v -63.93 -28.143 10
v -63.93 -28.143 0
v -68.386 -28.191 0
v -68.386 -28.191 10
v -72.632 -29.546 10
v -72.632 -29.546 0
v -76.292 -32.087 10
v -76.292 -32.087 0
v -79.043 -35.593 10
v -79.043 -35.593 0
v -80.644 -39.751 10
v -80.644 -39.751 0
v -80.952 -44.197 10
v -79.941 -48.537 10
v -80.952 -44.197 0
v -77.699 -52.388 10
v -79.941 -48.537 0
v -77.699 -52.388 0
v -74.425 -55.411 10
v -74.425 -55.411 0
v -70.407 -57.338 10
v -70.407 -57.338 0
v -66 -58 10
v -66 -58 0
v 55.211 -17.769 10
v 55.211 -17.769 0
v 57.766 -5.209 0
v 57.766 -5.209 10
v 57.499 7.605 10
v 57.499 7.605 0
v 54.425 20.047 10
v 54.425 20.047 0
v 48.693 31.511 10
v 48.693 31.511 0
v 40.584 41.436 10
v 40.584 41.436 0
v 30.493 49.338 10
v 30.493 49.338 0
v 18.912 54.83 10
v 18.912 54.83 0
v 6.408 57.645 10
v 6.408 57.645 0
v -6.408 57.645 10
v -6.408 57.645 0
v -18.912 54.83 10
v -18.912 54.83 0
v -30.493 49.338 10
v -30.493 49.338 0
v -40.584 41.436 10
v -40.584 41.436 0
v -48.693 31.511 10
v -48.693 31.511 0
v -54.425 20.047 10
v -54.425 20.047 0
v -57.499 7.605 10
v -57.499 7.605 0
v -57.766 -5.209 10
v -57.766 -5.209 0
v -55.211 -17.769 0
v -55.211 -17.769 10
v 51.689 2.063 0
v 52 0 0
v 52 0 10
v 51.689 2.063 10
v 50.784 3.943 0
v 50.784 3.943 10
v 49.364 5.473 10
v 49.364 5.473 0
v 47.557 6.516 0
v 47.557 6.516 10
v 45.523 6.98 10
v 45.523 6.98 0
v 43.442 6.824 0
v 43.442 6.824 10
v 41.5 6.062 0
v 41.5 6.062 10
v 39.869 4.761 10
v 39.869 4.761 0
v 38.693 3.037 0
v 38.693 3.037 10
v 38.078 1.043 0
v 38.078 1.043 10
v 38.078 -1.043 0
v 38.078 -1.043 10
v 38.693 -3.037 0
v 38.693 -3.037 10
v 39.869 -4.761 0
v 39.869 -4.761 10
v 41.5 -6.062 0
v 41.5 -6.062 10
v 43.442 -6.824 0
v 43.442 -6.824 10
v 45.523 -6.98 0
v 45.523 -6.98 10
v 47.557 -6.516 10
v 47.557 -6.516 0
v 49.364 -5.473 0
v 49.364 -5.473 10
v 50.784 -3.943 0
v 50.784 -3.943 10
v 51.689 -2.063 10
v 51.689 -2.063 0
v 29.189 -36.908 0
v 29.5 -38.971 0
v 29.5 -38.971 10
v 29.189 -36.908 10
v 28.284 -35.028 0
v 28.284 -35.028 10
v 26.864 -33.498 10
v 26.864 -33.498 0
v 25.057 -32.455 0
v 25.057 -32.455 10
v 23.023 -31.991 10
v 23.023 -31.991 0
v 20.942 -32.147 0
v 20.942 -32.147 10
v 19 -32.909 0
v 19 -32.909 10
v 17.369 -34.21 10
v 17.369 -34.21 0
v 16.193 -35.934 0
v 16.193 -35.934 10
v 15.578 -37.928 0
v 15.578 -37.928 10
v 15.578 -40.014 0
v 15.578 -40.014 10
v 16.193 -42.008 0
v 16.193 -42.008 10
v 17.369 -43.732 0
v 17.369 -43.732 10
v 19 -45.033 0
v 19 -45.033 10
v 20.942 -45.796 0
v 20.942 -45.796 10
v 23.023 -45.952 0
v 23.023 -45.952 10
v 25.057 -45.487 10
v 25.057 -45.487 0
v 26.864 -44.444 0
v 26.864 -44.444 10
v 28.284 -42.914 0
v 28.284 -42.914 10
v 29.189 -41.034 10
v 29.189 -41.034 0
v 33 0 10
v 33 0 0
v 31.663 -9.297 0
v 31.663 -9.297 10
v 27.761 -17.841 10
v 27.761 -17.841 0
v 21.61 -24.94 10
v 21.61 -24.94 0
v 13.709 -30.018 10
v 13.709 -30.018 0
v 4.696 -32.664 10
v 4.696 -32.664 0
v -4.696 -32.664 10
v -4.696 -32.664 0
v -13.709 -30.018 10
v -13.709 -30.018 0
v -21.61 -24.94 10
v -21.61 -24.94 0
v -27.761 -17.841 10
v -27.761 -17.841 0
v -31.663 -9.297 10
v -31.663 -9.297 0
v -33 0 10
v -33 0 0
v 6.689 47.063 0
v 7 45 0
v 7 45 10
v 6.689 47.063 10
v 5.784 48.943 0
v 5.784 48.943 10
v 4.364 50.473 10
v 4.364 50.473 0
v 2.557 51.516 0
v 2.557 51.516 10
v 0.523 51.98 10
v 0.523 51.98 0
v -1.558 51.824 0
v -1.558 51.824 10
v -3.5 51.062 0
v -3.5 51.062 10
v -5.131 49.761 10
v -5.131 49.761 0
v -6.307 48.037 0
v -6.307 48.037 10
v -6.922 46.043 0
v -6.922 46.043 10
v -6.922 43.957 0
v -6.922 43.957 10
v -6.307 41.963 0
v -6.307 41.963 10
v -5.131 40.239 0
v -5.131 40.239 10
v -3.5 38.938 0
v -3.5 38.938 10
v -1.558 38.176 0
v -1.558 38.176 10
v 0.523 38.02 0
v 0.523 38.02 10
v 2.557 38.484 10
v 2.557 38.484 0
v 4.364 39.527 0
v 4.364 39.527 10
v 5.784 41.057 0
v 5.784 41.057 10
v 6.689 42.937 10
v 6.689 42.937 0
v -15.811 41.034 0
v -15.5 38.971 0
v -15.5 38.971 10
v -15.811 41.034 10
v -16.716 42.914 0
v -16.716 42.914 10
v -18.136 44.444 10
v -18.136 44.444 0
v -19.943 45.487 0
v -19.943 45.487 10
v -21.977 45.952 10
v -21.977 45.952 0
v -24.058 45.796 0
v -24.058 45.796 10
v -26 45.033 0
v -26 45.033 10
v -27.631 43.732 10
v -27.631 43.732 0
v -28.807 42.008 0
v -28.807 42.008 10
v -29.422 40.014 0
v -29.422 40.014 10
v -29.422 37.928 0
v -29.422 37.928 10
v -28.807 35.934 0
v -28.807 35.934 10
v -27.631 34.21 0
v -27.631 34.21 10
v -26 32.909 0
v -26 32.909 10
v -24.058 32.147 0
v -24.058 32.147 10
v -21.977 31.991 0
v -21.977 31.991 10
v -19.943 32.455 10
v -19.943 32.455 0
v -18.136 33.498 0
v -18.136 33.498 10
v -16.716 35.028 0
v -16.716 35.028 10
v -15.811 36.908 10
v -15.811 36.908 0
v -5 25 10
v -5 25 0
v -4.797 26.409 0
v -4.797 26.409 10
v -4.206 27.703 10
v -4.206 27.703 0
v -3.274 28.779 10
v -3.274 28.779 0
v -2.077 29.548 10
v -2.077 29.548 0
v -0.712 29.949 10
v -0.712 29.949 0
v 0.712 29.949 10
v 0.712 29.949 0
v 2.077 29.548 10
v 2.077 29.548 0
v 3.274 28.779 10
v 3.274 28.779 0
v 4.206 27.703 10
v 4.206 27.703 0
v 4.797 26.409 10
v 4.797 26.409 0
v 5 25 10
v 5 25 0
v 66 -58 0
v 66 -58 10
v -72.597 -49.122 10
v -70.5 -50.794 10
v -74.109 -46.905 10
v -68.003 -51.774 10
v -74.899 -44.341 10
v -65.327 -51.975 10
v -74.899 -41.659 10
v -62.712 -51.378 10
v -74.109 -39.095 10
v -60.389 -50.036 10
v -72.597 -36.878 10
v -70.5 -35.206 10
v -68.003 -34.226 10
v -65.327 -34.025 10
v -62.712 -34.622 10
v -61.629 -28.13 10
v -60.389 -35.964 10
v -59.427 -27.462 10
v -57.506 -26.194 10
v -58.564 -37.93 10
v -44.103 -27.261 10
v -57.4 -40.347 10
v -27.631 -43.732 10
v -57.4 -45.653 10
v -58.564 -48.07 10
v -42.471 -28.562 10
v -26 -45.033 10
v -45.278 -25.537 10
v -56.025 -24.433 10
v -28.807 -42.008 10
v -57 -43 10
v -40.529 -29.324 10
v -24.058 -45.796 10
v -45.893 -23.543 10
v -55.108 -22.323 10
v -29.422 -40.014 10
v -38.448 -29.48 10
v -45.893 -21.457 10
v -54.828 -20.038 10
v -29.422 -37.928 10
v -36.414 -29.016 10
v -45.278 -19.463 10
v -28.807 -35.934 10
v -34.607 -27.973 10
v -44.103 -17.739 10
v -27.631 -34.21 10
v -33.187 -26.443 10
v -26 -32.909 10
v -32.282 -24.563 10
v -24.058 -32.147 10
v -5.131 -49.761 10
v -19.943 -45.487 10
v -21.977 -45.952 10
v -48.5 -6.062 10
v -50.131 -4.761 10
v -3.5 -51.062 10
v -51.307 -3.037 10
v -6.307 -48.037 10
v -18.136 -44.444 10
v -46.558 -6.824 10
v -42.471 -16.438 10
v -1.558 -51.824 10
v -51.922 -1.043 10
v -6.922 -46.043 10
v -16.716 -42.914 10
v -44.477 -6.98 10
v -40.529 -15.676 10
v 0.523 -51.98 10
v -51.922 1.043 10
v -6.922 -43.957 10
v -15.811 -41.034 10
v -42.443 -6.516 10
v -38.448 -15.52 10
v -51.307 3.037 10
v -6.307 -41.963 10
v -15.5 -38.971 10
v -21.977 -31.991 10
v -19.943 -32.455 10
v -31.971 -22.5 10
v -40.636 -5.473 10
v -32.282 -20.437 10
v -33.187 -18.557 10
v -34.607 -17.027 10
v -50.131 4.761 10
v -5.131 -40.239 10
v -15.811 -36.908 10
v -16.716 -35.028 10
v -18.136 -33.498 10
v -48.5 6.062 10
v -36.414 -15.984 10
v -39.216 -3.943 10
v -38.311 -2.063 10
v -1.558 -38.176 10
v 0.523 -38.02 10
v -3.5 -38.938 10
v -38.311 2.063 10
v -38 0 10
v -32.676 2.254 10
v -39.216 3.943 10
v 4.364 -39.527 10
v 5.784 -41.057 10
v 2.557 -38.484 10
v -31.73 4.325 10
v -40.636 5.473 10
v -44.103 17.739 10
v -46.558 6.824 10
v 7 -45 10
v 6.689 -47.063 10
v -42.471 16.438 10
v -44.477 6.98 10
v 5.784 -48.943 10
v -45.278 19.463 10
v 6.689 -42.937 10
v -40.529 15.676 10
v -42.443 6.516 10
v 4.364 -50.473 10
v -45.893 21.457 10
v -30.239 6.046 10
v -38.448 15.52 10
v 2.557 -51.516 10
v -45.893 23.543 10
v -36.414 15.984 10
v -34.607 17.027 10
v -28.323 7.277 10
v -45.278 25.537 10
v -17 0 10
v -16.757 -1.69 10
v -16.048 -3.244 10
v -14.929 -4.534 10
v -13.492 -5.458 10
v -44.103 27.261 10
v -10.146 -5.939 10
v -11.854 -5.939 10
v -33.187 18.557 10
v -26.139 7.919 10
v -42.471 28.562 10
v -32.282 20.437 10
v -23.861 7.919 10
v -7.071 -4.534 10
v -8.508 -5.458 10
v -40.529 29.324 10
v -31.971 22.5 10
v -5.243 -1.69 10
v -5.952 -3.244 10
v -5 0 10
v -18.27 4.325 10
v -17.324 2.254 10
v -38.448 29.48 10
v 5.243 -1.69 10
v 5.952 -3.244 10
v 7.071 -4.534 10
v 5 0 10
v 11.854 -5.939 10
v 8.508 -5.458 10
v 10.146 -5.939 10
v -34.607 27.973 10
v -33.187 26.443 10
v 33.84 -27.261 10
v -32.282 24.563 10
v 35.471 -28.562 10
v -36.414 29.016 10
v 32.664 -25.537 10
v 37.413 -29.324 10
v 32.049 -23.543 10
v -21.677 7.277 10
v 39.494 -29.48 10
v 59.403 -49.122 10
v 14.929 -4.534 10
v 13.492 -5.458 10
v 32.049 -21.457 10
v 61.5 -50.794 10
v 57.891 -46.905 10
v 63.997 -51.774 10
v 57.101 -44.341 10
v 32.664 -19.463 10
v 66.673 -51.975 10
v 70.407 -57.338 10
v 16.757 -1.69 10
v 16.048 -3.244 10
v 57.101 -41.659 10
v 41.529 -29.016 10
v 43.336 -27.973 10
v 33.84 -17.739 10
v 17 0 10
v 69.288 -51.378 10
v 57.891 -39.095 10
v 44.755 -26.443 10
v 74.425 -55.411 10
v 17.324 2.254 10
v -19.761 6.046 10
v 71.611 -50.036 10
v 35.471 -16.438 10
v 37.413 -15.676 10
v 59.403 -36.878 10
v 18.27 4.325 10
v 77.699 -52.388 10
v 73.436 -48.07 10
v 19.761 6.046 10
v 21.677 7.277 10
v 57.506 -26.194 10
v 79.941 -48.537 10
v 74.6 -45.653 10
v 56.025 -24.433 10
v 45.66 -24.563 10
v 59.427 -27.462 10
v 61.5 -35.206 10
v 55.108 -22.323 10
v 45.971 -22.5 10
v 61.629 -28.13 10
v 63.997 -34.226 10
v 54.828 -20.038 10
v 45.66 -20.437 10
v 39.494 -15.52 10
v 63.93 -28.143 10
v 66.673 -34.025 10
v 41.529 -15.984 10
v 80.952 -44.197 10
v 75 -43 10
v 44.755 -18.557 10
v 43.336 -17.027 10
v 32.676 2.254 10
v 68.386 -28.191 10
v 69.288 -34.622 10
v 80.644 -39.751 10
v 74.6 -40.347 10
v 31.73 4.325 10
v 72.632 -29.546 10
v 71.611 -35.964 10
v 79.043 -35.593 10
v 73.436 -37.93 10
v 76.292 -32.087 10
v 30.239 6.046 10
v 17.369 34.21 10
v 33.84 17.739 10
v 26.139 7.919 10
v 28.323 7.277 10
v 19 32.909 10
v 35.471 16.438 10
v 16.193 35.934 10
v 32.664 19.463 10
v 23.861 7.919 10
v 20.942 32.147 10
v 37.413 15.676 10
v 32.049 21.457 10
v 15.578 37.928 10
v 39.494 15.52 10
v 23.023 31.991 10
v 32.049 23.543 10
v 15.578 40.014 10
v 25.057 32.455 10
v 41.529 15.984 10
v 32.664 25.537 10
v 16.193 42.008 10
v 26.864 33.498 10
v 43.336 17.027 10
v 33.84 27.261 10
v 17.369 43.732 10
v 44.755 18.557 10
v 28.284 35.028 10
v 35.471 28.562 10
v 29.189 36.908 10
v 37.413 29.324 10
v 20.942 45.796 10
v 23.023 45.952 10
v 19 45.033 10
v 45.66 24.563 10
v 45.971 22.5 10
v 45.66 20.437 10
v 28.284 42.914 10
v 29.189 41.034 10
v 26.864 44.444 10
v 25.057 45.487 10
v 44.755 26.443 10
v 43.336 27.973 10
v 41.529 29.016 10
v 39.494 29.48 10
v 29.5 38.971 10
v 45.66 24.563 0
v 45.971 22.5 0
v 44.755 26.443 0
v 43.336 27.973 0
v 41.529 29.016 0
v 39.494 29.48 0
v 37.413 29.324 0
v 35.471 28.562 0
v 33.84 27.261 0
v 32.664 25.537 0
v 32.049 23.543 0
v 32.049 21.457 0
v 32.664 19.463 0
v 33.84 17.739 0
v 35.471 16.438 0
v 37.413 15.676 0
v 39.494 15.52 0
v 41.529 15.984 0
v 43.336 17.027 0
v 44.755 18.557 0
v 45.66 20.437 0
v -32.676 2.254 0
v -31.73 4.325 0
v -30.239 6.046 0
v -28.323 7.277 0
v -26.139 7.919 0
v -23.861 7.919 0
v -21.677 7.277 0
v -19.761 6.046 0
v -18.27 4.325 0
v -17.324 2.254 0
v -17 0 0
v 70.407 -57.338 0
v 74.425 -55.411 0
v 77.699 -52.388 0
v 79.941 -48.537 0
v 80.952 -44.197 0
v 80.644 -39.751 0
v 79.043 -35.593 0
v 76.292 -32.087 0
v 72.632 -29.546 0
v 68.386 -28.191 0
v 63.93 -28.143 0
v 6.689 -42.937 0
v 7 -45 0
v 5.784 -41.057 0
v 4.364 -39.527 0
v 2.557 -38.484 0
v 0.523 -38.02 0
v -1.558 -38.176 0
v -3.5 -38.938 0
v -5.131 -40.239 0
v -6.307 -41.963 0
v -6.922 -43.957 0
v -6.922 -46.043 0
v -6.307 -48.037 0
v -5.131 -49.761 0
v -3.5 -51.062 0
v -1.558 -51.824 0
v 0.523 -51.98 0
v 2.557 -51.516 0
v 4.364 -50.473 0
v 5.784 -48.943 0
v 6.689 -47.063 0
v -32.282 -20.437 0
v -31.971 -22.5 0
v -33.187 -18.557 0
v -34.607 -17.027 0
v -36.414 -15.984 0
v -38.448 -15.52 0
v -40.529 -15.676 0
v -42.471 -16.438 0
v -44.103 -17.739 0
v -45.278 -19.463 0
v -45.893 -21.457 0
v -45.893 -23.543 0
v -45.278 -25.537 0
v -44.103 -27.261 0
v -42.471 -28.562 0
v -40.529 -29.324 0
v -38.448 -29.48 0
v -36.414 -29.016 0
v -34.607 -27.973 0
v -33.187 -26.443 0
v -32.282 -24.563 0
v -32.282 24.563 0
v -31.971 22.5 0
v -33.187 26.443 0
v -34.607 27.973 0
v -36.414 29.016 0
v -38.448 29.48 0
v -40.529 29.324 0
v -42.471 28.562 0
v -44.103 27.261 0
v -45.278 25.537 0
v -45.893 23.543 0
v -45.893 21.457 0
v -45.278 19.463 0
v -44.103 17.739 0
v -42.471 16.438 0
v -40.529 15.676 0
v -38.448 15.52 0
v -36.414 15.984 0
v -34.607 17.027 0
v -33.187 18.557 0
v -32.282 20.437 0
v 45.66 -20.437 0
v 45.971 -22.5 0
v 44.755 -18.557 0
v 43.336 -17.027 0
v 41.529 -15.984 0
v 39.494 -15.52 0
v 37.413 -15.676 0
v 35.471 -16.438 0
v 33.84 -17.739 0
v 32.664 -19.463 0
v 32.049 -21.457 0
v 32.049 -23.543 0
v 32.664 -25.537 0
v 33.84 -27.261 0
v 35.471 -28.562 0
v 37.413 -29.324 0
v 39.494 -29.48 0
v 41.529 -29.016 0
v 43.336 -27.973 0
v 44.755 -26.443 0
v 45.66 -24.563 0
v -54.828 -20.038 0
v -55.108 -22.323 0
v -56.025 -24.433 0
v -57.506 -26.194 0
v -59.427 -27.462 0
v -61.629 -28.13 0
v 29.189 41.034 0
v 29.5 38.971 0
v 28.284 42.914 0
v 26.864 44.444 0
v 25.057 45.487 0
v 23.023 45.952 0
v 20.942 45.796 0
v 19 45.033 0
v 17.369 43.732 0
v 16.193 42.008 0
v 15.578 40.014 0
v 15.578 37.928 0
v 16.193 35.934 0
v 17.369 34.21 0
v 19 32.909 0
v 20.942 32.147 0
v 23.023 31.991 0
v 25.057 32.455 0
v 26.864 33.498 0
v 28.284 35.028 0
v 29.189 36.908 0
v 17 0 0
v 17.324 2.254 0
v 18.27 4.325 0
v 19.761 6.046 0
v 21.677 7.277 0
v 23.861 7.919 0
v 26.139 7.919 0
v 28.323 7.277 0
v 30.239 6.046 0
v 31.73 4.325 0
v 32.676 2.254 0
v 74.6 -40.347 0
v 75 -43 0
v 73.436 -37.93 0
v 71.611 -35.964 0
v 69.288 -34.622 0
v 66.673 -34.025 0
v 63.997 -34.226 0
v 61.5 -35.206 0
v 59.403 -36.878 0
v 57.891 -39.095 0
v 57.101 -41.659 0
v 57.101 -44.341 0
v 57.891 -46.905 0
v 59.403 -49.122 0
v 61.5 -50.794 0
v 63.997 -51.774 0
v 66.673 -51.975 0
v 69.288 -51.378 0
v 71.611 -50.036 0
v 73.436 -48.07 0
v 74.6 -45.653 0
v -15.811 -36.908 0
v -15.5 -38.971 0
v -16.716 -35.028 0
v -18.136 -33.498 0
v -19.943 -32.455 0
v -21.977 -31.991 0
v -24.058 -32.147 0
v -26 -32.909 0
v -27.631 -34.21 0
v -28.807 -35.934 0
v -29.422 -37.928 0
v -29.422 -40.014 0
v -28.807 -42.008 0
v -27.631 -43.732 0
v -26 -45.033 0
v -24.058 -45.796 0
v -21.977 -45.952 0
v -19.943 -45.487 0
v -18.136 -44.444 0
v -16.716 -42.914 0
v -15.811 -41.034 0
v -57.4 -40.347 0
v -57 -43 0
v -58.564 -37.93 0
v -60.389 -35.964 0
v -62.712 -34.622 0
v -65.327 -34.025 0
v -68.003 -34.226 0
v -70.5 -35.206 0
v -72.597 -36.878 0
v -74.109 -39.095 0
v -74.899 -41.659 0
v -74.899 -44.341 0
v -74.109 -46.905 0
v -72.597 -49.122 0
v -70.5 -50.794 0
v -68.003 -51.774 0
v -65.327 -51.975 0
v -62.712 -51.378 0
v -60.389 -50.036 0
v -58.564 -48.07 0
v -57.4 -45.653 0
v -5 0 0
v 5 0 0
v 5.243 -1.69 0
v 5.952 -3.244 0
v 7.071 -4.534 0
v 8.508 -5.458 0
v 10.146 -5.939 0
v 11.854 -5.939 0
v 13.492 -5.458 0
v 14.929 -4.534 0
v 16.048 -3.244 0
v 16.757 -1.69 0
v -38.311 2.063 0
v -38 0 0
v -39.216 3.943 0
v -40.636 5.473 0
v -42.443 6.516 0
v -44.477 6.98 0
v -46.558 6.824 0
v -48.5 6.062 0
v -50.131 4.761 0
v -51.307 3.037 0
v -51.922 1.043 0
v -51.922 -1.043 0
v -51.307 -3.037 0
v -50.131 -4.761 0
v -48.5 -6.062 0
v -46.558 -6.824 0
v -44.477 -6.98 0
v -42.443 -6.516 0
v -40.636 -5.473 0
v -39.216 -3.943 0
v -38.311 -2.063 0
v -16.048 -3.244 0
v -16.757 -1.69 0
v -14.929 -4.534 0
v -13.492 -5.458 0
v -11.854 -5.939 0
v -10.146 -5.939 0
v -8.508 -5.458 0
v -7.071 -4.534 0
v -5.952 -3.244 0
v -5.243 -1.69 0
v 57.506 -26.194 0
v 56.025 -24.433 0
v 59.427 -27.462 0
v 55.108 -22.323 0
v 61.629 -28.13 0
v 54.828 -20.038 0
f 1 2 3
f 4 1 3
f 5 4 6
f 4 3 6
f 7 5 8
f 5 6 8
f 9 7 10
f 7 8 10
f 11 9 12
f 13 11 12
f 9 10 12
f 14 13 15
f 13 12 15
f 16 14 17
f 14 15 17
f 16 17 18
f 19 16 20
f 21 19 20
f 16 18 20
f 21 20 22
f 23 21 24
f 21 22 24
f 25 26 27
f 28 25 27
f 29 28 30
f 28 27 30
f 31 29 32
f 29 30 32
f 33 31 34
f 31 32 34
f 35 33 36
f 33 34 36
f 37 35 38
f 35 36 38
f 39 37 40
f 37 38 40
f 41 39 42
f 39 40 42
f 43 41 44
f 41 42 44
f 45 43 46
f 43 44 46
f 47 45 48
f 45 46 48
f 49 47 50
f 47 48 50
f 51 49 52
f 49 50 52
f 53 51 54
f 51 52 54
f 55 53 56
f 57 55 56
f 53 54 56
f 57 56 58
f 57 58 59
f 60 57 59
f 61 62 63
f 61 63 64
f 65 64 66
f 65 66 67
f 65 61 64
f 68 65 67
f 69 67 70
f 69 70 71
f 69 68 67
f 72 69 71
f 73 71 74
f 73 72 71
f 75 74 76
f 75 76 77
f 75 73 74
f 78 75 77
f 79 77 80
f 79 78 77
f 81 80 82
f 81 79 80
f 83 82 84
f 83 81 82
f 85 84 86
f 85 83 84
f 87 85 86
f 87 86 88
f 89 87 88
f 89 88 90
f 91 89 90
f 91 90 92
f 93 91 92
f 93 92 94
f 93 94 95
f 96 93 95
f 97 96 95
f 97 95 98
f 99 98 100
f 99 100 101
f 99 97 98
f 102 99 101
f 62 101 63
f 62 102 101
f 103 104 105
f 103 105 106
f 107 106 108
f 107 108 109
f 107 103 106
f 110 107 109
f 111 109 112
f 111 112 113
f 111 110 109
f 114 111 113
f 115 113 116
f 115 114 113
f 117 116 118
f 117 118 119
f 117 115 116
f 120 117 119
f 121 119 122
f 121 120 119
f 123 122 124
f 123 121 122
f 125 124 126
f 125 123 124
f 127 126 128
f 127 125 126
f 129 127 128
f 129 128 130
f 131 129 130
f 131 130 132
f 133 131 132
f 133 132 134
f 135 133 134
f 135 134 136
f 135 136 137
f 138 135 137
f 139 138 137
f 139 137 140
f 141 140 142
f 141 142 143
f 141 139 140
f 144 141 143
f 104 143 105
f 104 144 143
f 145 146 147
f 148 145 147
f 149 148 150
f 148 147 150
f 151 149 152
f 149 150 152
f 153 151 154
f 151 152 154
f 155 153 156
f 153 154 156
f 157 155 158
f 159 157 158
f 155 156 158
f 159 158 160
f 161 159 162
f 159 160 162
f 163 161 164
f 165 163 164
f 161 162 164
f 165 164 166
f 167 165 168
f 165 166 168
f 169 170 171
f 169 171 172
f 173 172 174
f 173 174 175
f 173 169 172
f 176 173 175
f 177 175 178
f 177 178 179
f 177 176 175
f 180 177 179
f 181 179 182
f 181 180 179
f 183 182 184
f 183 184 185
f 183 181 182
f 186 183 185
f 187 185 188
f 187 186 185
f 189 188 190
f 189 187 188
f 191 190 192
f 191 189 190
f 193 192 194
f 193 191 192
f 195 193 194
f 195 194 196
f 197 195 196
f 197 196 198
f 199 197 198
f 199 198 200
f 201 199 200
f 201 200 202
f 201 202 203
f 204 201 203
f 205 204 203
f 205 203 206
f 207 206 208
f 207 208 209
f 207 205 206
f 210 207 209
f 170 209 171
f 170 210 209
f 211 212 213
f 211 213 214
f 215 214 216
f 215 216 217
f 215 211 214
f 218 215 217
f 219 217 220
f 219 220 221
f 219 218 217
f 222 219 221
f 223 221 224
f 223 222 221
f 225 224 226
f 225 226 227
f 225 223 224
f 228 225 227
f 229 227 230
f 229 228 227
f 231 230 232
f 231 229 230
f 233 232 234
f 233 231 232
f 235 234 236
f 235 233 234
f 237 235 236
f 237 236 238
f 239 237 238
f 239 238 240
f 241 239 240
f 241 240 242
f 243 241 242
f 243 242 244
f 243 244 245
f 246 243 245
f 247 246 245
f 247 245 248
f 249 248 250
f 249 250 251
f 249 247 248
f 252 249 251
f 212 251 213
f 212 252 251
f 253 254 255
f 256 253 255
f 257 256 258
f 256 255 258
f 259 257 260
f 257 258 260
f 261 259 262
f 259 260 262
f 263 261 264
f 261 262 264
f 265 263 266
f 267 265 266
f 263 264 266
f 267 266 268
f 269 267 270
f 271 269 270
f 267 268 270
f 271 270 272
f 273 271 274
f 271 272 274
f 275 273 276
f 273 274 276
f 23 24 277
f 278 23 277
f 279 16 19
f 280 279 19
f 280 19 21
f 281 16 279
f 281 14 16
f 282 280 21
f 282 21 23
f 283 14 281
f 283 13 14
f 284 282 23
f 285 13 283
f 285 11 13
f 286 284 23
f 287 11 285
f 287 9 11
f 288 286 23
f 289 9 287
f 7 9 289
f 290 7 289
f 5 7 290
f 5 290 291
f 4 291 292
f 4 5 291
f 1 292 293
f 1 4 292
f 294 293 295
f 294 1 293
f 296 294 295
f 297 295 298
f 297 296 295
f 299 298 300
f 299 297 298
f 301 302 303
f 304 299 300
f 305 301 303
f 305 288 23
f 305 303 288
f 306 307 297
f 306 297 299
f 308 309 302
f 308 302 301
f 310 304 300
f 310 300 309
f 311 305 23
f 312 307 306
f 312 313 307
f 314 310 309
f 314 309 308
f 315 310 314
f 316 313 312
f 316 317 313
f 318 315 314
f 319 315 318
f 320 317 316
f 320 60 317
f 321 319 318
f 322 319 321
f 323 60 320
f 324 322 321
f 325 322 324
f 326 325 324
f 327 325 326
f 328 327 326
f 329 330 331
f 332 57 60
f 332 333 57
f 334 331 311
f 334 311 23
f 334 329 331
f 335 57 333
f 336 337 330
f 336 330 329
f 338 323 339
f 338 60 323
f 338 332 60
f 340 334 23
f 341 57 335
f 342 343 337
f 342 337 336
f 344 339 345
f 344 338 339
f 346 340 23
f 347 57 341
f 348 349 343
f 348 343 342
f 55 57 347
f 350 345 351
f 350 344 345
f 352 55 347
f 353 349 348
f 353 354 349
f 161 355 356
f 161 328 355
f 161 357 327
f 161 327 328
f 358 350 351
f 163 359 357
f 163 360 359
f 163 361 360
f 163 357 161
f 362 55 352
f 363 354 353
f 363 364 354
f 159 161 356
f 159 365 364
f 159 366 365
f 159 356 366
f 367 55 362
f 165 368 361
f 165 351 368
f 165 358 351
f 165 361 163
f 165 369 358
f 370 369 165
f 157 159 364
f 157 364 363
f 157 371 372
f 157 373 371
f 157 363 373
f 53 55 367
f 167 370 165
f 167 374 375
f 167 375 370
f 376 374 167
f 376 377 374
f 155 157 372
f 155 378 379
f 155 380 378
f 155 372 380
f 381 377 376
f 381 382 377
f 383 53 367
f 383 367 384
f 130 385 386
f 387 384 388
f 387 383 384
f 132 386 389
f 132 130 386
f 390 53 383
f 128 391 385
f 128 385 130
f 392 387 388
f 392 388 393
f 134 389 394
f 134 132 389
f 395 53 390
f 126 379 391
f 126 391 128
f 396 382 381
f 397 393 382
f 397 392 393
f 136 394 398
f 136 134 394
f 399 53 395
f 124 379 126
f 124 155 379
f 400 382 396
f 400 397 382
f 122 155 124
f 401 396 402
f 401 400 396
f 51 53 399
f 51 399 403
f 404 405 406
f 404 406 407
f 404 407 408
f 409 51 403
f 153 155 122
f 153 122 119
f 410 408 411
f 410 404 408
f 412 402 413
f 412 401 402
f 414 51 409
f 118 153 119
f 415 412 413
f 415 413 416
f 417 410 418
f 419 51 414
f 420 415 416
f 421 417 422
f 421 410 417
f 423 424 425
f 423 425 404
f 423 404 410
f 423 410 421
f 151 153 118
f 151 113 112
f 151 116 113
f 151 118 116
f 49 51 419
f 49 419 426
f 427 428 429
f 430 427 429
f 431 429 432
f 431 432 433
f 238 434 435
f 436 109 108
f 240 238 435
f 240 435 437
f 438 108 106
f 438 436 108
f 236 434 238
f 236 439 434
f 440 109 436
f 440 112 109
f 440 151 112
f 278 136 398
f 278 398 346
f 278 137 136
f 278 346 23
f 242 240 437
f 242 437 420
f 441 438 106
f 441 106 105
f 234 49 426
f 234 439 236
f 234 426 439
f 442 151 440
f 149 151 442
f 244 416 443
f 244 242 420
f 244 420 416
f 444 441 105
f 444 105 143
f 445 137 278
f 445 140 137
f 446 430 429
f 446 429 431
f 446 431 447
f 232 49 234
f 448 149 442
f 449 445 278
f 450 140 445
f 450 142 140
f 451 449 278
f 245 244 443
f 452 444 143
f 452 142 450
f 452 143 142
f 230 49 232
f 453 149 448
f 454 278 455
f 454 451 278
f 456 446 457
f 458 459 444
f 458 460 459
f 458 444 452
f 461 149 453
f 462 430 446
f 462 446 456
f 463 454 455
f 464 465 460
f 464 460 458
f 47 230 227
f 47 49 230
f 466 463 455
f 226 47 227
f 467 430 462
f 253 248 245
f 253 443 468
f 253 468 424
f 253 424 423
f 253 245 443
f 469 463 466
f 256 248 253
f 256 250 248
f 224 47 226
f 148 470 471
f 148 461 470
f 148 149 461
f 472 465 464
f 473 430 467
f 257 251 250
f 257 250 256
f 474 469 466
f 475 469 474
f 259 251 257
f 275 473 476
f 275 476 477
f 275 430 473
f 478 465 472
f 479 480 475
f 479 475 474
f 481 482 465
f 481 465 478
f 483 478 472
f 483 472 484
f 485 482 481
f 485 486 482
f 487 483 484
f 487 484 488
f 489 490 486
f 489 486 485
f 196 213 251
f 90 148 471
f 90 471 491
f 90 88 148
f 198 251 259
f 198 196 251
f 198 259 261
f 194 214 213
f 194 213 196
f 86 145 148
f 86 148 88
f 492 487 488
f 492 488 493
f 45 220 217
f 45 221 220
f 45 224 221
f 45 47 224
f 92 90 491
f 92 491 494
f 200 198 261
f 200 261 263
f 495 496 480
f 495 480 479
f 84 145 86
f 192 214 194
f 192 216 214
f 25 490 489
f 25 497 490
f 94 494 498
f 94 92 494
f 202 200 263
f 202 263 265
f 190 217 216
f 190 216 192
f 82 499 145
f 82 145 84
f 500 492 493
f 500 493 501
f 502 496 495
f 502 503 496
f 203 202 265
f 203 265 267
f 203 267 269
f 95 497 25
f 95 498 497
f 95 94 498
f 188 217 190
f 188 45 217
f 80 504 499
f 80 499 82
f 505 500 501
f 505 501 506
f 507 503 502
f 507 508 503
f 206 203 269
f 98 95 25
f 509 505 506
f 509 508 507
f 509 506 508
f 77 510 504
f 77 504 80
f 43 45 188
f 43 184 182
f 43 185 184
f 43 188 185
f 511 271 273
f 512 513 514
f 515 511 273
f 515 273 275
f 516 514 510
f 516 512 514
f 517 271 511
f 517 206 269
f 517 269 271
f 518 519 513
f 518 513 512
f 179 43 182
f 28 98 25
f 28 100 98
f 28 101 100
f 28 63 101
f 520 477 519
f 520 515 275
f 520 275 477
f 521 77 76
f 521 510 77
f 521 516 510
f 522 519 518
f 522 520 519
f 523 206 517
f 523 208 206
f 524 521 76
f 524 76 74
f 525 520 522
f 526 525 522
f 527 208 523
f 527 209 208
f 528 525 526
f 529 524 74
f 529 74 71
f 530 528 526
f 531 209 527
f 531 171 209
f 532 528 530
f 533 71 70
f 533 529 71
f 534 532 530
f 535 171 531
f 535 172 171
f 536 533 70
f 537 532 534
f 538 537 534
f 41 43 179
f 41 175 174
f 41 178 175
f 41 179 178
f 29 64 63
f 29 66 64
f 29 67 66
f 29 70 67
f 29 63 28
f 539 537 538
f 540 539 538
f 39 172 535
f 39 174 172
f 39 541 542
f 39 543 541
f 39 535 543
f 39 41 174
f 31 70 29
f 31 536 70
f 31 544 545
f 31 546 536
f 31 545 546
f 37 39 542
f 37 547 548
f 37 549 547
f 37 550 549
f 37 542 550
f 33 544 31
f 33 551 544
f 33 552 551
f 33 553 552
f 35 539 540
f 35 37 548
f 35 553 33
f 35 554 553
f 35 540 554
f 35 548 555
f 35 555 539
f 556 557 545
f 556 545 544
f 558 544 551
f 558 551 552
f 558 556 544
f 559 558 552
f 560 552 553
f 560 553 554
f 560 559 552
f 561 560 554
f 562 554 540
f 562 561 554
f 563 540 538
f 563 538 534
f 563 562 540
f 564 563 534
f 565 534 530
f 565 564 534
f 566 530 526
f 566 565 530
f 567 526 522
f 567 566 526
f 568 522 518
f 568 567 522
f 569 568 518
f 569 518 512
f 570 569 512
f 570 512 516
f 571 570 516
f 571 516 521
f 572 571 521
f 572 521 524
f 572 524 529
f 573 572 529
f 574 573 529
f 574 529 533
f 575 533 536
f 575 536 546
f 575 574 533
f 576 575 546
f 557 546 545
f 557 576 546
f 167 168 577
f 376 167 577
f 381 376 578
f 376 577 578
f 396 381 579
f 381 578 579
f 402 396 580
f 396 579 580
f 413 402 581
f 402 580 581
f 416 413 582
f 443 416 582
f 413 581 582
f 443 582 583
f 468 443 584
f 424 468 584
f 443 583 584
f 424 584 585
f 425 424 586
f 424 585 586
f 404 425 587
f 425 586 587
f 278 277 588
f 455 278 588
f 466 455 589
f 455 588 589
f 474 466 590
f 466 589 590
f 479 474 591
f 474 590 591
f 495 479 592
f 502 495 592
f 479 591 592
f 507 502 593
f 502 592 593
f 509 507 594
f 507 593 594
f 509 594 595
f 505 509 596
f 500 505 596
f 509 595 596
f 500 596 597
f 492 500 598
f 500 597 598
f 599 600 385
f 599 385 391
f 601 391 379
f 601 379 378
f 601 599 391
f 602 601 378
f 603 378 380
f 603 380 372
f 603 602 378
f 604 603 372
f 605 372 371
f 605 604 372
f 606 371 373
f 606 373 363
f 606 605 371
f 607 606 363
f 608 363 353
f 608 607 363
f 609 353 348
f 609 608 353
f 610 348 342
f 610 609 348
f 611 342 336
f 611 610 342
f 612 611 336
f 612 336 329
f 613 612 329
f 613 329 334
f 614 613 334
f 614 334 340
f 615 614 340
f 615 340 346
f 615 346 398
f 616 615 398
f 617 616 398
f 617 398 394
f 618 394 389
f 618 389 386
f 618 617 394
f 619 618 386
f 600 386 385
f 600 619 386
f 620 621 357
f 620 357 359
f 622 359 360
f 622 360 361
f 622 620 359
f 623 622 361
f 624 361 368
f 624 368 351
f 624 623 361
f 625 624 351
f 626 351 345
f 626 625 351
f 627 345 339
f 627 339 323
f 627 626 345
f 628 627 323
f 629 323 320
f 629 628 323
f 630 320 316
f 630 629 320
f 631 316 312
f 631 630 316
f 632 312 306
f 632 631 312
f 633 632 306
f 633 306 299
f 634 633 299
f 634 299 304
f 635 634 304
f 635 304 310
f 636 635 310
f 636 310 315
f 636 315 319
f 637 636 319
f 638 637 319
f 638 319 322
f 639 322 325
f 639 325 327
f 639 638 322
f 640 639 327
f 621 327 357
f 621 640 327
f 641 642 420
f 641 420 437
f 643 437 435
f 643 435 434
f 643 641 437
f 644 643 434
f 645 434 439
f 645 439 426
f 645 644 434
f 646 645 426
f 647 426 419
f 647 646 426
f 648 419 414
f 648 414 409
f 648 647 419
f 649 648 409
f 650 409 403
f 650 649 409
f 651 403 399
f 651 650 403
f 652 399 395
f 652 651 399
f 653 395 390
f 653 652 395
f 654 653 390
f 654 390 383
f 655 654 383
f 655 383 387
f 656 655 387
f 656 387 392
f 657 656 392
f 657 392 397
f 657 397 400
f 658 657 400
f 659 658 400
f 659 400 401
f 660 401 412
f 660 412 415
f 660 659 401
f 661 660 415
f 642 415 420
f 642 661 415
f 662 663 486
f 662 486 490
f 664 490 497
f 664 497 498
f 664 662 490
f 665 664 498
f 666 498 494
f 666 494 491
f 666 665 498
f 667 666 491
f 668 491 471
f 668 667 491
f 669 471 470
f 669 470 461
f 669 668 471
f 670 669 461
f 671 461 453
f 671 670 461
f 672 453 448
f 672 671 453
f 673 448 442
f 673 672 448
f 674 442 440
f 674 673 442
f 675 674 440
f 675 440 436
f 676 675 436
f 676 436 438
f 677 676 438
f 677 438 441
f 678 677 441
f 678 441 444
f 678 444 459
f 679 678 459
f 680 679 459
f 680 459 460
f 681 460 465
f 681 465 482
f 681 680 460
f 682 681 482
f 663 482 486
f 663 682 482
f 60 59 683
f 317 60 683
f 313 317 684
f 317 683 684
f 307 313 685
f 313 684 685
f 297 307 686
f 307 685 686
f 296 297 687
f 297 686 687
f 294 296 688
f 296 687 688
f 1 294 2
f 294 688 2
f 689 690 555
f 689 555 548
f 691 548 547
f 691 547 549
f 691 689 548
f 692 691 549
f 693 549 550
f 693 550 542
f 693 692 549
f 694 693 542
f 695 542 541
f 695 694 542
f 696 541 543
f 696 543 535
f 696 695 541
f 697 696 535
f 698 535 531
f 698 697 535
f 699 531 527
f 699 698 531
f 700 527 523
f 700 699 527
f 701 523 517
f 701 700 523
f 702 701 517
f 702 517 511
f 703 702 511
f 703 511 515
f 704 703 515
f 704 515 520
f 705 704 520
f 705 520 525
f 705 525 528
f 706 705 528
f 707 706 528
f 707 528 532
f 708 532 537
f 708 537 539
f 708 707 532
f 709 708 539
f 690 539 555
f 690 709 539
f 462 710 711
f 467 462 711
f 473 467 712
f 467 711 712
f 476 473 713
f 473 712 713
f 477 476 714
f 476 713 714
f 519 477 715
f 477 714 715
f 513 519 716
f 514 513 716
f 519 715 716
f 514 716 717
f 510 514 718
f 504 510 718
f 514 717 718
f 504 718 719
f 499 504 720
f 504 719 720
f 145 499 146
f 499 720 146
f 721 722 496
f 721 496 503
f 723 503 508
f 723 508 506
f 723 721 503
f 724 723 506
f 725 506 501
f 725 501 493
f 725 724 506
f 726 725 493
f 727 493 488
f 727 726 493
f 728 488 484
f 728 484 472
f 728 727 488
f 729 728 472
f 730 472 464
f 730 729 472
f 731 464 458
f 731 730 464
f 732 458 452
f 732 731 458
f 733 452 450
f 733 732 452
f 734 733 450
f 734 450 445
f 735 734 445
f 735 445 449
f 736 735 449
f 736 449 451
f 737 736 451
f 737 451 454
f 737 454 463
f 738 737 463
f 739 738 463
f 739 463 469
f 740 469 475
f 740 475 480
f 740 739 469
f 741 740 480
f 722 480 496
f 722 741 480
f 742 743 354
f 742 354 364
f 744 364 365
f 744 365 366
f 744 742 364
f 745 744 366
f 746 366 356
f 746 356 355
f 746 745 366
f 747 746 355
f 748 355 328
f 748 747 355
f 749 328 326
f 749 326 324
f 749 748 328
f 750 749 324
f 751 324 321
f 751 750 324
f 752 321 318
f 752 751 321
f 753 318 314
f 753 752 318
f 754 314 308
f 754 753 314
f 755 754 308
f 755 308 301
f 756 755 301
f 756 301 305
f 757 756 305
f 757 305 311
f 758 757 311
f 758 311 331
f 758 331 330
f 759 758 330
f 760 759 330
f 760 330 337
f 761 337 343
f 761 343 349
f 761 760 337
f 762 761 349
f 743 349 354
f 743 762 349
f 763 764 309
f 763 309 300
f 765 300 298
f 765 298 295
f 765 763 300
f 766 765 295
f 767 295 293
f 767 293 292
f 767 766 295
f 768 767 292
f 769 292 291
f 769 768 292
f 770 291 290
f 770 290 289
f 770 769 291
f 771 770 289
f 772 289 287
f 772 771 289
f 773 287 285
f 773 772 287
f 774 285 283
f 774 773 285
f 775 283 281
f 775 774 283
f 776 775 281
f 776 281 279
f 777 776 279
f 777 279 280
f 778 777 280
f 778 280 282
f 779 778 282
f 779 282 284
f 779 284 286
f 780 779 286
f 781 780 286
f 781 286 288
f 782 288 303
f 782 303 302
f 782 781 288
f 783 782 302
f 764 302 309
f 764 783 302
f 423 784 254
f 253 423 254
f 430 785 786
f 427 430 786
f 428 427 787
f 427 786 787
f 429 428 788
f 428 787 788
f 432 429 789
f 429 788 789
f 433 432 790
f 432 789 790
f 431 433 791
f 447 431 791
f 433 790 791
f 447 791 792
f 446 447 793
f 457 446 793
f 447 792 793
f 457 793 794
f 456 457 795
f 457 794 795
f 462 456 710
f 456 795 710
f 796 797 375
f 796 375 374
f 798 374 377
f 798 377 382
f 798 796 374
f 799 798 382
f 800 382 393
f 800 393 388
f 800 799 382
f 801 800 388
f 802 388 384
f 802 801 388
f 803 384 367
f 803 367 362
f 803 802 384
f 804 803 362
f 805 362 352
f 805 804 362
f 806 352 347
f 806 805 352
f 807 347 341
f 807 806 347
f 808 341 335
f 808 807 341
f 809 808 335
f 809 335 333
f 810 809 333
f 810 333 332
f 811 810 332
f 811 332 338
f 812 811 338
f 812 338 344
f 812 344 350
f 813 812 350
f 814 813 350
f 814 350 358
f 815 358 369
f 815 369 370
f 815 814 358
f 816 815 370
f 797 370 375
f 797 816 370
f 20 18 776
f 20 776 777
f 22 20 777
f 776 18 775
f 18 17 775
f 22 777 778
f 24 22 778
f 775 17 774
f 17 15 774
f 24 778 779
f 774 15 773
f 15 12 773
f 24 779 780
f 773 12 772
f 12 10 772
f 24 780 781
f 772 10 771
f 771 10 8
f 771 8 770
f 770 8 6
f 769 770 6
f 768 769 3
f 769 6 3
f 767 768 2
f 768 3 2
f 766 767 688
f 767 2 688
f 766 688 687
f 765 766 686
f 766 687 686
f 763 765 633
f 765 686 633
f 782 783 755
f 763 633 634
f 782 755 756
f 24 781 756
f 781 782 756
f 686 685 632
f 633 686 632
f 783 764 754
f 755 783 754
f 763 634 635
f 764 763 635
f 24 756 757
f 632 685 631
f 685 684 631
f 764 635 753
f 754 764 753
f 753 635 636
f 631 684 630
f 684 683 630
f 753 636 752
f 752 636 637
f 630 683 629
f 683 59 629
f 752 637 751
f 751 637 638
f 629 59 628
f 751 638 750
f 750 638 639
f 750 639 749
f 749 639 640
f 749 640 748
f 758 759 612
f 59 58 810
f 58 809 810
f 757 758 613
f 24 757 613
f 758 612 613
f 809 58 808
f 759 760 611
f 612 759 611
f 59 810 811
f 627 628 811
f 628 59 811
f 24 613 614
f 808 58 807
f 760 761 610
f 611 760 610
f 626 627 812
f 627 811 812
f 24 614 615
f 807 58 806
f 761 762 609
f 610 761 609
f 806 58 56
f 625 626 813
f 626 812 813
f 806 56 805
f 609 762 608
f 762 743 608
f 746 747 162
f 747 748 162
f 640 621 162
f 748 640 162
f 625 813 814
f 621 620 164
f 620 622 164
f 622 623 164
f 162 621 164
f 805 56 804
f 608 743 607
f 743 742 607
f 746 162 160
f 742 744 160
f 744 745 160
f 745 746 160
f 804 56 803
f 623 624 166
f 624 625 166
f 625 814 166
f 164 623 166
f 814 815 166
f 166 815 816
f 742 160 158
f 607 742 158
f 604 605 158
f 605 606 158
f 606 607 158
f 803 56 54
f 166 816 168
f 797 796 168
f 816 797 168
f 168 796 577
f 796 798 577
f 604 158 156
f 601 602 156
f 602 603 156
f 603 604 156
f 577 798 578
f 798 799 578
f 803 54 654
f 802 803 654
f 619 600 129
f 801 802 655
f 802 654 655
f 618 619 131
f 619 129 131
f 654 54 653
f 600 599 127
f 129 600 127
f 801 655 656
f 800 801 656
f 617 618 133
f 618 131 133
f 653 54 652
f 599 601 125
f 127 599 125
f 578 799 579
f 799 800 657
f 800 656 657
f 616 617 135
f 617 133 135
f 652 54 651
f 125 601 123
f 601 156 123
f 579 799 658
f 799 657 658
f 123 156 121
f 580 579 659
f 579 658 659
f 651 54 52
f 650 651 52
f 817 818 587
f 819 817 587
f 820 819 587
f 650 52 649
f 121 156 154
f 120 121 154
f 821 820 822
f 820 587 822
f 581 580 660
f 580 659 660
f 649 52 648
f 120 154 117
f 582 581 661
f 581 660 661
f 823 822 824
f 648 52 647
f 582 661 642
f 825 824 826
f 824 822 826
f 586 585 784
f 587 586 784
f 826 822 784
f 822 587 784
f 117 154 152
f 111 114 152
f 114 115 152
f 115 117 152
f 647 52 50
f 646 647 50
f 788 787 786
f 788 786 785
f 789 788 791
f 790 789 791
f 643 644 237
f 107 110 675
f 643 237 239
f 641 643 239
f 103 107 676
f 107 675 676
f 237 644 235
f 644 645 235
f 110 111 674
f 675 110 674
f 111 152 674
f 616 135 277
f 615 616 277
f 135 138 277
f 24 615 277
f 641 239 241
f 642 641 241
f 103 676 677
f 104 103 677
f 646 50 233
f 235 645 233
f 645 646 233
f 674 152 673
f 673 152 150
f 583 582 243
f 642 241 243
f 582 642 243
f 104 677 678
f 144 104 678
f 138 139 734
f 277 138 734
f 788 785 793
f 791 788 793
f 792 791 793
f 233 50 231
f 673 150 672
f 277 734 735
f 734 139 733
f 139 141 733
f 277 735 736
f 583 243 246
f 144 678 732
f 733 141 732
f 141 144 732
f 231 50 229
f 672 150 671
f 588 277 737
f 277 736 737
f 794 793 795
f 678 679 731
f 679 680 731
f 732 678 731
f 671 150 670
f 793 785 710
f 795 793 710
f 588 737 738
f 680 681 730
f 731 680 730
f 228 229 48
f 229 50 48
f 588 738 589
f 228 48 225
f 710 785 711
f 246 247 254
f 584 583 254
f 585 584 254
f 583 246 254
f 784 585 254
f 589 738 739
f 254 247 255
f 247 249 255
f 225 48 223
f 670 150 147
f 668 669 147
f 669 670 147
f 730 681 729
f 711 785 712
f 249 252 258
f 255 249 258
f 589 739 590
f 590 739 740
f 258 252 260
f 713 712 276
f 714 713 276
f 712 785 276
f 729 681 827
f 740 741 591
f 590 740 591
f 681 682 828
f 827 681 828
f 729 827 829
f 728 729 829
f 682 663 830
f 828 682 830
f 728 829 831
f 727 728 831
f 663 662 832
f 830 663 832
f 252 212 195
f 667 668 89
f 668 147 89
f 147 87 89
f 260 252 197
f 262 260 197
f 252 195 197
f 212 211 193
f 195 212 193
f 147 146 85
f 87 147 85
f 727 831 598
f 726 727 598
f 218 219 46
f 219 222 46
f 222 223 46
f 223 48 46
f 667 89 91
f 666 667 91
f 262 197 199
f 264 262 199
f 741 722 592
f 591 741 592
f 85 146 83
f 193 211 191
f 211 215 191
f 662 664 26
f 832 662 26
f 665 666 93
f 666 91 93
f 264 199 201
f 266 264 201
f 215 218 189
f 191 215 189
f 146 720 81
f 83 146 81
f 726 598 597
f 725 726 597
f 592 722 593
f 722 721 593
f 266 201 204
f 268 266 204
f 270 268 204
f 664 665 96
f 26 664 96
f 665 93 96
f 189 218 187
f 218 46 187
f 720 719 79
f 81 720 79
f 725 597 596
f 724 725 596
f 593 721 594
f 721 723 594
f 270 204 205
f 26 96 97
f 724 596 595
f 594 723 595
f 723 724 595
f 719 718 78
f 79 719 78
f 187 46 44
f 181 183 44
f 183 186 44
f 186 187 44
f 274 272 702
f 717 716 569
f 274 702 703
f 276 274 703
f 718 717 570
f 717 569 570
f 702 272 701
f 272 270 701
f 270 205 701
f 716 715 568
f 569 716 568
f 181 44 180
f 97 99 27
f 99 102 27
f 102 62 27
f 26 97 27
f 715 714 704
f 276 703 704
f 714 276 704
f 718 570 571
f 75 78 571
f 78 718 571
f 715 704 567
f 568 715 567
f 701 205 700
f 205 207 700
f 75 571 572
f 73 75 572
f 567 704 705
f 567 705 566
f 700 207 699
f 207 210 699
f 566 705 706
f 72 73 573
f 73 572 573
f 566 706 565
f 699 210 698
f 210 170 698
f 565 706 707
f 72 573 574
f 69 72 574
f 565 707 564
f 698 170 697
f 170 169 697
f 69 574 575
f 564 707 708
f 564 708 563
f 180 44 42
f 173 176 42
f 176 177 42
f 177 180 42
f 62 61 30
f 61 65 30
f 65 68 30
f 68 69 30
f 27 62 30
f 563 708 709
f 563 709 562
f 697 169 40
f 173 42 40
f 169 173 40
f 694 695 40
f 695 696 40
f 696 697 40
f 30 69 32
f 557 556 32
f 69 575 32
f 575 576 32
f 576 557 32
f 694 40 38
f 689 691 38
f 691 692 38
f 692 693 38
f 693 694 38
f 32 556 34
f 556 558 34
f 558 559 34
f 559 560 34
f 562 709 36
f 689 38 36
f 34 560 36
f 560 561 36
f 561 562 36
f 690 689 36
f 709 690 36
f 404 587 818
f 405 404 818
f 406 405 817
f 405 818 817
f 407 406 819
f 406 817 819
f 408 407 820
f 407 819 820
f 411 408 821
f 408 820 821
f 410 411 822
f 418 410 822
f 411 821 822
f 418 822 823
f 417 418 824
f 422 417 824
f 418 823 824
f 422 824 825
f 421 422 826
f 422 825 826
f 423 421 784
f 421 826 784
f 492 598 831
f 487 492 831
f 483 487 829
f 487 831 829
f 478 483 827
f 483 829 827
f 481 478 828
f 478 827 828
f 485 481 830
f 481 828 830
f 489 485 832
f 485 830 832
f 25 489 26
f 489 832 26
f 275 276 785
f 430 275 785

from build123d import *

# Parameters (mm, degrees)
CROQUIS1_R              = 58
CROQUIS1_R_2            = 7
CROQUIS1_R_3            = 9
SALIENTE_EXTRUIR1_DEPTH = 10


with BuildPart() as part:
    # Croquis1 → Saliente-Extruir1 (new body)
    # profile 1 of 3: a face of its own
    with BuildSketch(Plane.XY):
        Circle(CROQUIS1_R)
        with Locations((-22.5, 38.97114317)):
            Circle(CROQUIS1_R_2, mode=Mode.SUBTRACT)
        with Locations((-38.97114317, 22.5)):
            Circle(CROQUIS1_R_2, mode=Mode.SUBTRACT)
        with Locations((-45, 0)):
            Circle(CROQUIS1_R_2, mode=Mode.SUBTRACT)
        with Locations((-38.97114317, -22.5)):
            Circle(CROQUIS1_R_2, mode=Mode.SUBTRACT)
        with Locations((-22.5, -38.97114317)):
            Circle(CROQUIS1_R_2, mode=Mode.SUBTRACT)
        with Locations((0, -45)):
            Circle(CROQUIS1_R_2, mode=Mode.SUBTRACT)
        with Locations((22.5, -38.97114317)):
            Circle(CROQUIS1_R_2, mode=Mode.SUBTRACT)
        with Locations((38.97114317, -22.5)):
            Circle(CROQUIS1_R_2, mode=Mode.SUBTRACT)
        with Locations((45, 0)):
            Circle(CROQUIS1_R_2, mode=Mode.SUBTRACT)
        with Locations((38.97114317, 22.5)):
            Circle(CROQUIS1_R_2, mode=Mode.SUBTRACT)
        with Locations((22.5, 38.97114317)):
            Circle(CROQUIS1_R_2, mode=Mode.SUBTRACT)
        with Locations((0, 45)):
            Circle(CROQUIS1_R_2, mode=Mode.SUBTRACT)
        with BuildLine():
            Line((5, 25), (5, 0))
            ThreePointArc((5, 0), (11, -6), (17, 0))
            ThreePointArc((17, 0), (25, 8), (33, 0))
            ThreePointArc((33, 0), (0, -33), (-33, 0))
            ThreePointArc((-33, 0), (-25, 8), (-17, 0))
            ThreePointArc((-17, 0), (-11, -6), (-5, 0))
            Line((-5, 0), (-5, 25))
            ThreePointArc((-5, 25), (0, 30), (5, 25))
        make_face(mode=Mode.SUBTRACT)
    # profile 2 of 3: a face of its own
    with BuildSketch(Plane.XY):
        with BuildLine():
            Line((1.58e-07, -58), (66, -58))
            ThreePointArc((66, -58), (80.964085993, -41.962632957), (63.930233382, -28.143484051))
            ThreePointArc((63.930233382, -28.143484051), (56.702087905, -25.367174857), (55.211041749, -17.769098711))
            ThreePointArc((55.211041749, -17.769098711), (34.156934021, -46.87540782), (1.58e-07, -58))
        make_face()
        with Locations((66, -43)):
            Circle(CROQUIS1_R_3, mode=Mode.SUBTRACT)
    # profile 3 of 3: a face of its own
    with BuildSketch(Plane.XY):
        with BuildLine():
            Line((-66, -58), (1.58e-07, -58))
            ThreePointArc((1.58e-07, -58), (-34.156933894, -46.875407913), (-55.211041749, -17.769098711))
            ThreePointArc((-55.211041749, -17.769098711), (-56.702087905, -25.367174857), (-63.930233382, -28.143484051))
            ThreePointArc((-63.930233382, -28.143484051), (-80.964085993, -41.962632957), (-66, -58))
        make_face()
        with Locations((-66, -43)):
            Circle(CROQUIS1_R_3, mode=Mode.SUBTRACT)
    extrude(amount=SALIENTE_EXTRUIR1_DEPTH)


solid = part.part
